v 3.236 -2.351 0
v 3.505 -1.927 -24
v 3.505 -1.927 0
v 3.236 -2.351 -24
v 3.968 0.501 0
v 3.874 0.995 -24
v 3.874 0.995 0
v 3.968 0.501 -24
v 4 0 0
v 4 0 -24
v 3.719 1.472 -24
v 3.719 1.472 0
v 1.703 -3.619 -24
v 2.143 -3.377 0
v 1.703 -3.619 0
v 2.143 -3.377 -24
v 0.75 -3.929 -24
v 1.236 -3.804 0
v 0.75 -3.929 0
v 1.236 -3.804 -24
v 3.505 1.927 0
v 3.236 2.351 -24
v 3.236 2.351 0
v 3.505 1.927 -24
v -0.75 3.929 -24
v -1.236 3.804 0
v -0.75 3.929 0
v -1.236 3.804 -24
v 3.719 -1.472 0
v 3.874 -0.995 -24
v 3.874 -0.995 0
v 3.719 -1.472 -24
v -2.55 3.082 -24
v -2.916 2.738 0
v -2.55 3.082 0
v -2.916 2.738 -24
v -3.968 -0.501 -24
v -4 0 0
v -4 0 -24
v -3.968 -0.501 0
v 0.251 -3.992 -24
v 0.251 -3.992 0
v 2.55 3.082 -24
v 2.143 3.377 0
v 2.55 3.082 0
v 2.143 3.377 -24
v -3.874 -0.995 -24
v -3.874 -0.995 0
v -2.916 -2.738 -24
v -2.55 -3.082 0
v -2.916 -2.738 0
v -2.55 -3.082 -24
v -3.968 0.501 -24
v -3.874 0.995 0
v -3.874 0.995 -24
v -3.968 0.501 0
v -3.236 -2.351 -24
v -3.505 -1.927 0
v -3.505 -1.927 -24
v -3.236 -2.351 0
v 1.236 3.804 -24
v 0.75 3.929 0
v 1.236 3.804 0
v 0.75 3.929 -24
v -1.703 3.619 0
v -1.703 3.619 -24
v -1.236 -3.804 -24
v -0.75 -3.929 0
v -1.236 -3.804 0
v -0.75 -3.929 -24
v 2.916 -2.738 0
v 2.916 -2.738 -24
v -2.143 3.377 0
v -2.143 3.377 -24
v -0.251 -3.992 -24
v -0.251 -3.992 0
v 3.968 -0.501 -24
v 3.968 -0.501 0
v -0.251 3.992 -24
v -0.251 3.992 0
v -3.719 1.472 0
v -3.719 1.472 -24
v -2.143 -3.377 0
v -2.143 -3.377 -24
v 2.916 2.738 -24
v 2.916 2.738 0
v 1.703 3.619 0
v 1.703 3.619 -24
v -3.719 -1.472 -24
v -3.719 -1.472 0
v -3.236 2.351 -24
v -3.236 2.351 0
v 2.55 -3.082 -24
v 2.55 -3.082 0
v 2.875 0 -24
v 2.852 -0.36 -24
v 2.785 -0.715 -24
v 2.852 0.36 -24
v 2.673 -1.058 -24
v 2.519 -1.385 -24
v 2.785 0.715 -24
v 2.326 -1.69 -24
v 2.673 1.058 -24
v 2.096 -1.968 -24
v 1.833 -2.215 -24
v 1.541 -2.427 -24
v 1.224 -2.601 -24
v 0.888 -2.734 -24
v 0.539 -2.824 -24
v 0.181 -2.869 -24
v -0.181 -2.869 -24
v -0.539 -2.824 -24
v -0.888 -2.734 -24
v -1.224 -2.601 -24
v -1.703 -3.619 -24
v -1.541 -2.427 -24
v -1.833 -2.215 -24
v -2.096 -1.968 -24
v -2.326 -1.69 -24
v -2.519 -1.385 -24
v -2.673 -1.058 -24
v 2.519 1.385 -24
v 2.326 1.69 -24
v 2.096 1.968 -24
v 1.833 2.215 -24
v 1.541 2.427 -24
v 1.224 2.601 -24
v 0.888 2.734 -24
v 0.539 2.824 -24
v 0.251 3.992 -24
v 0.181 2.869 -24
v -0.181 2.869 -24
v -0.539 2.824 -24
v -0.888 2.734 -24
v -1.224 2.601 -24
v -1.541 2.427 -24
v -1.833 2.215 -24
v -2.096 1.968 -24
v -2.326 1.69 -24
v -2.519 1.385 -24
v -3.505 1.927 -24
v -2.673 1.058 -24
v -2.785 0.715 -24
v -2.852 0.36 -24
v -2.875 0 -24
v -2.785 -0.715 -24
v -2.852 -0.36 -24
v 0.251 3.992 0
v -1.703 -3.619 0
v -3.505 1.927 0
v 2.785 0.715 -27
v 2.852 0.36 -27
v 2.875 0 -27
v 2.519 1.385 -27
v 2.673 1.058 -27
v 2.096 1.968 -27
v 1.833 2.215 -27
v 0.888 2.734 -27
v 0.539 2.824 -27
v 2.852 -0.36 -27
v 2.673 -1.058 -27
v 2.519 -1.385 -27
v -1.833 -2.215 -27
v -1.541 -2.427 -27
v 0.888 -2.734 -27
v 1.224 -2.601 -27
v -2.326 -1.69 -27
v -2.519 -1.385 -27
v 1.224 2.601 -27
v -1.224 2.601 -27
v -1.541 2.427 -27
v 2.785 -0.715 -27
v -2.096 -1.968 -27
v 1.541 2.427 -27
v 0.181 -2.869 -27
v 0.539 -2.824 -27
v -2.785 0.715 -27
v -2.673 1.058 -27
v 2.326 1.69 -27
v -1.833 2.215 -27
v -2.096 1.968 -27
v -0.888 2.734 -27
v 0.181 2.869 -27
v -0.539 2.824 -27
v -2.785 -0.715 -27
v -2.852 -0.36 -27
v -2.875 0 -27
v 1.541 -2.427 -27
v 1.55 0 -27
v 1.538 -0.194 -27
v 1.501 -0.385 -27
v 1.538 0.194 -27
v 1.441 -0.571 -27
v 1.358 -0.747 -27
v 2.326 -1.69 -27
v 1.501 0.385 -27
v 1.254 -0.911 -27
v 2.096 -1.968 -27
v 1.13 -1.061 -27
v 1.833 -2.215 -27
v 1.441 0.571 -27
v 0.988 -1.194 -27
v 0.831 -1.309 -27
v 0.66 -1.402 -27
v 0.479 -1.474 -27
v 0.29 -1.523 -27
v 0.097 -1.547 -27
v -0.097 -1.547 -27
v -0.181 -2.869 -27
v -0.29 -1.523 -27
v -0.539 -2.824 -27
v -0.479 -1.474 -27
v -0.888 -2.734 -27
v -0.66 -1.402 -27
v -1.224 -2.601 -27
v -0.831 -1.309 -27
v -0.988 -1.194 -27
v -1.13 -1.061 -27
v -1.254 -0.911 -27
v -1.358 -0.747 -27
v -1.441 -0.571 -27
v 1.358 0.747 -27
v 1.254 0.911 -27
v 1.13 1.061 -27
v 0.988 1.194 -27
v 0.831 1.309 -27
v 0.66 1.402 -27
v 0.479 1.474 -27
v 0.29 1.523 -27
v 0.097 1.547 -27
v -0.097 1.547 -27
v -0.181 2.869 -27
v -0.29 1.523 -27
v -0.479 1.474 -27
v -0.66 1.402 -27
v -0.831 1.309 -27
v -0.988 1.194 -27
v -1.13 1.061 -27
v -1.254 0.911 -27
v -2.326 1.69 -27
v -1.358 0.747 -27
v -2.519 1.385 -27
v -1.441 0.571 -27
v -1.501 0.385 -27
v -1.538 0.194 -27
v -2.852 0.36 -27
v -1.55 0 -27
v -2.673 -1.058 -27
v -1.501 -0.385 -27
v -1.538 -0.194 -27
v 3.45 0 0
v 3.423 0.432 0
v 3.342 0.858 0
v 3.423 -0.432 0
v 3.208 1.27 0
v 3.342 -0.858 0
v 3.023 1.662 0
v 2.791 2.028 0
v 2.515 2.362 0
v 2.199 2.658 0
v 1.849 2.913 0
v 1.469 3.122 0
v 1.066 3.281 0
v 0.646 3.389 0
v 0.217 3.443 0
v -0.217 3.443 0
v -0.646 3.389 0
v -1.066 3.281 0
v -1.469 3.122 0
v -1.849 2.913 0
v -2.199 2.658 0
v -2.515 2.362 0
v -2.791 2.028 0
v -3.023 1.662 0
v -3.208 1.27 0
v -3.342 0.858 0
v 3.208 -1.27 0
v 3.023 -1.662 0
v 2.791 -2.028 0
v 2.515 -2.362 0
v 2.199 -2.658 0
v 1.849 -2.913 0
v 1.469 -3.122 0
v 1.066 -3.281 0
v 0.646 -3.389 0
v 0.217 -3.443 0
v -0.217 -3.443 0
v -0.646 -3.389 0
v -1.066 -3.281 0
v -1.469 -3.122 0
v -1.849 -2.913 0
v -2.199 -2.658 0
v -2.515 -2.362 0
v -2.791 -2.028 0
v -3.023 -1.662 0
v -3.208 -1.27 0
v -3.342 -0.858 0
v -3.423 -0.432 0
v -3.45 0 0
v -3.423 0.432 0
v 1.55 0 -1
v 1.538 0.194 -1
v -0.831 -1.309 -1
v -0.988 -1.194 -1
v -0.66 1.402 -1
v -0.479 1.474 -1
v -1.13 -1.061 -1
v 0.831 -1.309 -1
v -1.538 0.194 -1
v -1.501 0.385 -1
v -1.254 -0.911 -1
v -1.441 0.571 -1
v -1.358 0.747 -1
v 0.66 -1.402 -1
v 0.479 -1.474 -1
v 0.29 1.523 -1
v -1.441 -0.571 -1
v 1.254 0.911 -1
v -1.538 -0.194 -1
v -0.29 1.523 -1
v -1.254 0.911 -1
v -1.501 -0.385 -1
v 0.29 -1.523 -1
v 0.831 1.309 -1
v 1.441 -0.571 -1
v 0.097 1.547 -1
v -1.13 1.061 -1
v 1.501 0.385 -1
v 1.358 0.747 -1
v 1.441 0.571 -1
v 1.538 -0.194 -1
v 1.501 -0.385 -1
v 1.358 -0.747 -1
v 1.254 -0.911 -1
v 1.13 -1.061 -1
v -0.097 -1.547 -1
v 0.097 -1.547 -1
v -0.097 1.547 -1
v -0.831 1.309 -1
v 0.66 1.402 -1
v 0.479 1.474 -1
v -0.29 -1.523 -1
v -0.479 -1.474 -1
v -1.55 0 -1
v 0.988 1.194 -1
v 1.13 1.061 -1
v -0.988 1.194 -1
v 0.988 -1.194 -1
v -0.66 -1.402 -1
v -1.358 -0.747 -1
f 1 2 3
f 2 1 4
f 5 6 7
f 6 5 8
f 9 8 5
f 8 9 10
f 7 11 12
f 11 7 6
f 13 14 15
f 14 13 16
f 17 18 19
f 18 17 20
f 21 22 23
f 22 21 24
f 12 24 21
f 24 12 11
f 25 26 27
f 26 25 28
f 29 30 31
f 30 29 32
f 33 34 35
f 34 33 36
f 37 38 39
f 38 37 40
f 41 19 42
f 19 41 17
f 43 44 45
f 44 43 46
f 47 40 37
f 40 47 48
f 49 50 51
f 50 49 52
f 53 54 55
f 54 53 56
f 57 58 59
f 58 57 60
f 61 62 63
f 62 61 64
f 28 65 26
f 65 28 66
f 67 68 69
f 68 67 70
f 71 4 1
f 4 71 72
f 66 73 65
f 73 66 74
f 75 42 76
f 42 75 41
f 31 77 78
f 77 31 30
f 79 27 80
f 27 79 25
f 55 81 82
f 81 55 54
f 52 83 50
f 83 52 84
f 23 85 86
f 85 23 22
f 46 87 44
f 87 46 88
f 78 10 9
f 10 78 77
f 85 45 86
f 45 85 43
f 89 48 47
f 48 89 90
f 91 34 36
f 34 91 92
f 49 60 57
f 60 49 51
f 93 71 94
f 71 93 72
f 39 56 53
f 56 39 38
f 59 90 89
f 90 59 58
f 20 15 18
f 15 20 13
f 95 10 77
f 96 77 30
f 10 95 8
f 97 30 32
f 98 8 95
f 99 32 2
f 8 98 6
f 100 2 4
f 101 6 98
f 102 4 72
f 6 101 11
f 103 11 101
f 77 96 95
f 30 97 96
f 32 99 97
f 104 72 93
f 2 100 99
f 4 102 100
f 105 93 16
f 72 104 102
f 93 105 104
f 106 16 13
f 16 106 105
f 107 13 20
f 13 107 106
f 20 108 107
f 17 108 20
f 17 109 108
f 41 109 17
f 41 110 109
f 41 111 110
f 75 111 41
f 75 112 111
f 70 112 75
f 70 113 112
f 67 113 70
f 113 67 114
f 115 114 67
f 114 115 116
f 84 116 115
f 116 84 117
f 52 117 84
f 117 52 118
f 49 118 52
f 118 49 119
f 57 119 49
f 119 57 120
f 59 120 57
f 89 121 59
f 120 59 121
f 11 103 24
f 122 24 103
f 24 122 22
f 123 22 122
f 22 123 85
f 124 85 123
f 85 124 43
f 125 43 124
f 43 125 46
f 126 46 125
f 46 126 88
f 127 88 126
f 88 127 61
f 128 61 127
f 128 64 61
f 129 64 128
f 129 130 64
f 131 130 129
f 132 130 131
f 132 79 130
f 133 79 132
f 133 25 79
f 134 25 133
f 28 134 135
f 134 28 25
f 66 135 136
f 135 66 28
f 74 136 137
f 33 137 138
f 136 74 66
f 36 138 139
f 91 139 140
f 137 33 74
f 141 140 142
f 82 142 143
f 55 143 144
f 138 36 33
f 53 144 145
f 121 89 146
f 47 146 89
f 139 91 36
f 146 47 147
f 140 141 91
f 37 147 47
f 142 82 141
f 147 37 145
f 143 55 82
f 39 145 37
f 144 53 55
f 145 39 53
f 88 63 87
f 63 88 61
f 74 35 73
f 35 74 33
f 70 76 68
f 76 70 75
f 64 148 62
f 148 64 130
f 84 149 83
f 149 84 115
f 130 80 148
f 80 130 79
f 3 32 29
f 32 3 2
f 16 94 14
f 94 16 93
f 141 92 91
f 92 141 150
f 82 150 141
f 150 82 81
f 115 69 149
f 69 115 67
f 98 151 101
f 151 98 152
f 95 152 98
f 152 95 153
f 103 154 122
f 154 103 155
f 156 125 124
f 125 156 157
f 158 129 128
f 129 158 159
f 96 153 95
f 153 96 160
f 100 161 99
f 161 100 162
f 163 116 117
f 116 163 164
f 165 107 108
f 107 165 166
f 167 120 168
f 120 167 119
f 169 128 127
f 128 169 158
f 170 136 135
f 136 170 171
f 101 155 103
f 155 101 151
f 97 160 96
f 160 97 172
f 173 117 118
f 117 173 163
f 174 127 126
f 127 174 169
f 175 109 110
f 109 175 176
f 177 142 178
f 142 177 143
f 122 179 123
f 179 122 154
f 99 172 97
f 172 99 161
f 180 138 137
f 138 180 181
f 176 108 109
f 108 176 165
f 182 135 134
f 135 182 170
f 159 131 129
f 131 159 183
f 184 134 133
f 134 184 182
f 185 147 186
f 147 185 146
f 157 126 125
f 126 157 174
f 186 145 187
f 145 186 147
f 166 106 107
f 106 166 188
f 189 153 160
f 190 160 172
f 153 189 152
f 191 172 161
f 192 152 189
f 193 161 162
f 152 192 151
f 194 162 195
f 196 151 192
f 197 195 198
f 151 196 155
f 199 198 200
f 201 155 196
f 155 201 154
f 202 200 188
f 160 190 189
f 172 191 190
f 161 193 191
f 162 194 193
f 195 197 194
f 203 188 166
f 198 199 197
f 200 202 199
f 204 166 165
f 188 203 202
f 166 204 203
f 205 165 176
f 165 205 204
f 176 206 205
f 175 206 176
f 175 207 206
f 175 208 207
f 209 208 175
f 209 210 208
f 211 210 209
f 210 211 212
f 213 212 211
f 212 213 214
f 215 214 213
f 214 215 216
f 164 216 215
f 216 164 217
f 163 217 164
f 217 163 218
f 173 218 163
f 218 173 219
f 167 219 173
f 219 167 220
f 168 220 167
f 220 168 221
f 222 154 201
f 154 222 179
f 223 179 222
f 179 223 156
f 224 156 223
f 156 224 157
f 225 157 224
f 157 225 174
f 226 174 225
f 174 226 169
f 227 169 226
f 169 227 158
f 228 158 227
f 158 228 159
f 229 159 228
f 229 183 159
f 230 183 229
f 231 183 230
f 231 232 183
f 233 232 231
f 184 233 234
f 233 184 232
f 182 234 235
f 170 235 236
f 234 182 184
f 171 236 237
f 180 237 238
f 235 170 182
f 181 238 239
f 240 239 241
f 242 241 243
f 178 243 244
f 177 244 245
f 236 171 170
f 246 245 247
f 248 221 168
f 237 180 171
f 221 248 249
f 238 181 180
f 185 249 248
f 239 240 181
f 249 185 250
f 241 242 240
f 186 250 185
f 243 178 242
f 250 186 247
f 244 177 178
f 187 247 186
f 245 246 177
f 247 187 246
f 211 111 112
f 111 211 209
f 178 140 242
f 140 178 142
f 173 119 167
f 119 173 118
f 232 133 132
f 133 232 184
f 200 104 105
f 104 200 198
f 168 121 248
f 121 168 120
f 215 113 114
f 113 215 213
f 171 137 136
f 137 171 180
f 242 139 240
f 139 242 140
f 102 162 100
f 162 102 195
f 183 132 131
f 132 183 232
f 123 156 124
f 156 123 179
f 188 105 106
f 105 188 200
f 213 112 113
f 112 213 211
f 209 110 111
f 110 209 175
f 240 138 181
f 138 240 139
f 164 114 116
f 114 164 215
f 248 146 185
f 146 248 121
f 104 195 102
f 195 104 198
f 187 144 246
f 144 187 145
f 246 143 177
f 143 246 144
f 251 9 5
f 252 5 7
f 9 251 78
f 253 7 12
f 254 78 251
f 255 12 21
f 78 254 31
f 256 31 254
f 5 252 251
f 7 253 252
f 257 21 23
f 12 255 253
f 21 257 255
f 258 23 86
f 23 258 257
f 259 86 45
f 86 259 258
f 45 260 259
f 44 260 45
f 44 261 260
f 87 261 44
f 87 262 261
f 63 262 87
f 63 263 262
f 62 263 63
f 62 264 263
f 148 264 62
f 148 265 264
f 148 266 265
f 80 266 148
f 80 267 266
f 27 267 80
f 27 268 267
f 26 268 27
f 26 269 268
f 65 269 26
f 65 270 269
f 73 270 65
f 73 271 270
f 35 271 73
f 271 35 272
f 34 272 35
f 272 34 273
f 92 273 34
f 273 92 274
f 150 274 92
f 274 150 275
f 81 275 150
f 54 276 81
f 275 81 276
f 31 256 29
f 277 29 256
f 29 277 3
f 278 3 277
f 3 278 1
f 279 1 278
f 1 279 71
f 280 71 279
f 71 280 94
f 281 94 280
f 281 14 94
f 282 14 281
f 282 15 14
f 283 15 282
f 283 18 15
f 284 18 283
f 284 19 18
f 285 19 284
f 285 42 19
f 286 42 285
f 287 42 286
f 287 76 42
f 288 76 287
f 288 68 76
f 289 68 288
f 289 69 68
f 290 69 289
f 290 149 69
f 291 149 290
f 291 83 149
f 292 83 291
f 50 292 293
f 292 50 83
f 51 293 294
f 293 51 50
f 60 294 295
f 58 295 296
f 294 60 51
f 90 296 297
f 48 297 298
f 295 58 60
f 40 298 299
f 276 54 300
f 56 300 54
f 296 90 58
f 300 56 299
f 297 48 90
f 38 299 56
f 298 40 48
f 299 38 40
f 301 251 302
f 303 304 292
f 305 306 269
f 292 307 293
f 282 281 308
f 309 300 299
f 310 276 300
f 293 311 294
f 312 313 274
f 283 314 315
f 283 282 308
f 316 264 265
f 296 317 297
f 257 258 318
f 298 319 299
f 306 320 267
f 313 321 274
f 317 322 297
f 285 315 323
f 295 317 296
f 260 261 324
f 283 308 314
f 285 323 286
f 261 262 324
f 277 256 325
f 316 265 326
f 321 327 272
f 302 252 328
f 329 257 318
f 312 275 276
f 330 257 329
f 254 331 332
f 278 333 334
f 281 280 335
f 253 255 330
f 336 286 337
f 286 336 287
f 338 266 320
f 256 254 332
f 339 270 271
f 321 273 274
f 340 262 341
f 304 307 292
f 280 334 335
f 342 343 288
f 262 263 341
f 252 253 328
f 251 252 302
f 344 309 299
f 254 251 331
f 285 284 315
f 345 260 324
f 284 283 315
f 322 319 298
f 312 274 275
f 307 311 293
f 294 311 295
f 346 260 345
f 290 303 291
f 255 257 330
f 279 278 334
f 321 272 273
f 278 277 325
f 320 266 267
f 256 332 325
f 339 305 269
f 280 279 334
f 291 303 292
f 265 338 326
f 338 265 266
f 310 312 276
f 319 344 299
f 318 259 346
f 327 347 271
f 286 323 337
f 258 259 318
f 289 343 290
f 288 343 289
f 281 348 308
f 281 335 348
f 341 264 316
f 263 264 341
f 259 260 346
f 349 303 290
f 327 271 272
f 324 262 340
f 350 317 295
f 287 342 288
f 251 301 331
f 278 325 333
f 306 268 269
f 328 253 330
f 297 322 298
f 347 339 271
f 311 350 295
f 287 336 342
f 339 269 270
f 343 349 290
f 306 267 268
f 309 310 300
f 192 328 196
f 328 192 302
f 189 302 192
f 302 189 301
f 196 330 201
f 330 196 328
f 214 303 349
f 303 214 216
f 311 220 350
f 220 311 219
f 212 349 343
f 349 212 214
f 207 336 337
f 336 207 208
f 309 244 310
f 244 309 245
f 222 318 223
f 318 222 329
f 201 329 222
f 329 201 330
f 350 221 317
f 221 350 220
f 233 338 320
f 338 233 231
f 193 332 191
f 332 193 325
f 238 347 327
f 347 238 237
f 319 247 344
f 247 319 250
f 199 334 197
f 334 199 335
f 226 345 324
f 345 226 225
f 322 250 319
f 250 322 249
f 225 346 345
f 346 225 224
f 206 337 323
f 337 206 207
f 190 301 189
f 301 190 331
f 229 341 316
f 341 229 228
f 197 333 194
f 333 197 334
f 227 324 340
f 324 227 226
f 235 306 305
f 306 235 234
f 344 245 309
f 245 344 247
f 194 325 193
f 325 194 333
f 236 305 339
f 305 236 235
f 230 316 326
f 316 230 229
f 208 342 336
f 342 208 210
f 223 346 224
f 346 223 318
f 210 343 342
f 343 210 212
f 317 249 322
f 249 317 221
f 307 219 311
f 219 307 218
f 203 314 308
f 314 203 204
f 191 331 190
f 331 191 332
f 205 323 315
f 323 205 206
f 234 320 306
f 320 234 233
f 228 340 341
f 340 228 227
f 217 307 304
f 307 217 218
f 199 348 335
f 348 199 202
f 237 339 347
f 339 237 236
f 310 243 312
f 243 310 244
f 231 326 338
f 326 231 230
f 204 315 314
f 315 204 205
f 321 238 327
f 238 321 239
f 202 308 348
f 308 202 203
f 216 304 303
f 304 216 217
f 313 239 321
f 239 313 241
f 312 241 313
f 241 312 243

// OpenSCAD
$fn = 50;

difference() {
	union() {
		translate(v = [0, 0, -24.0]) {
			cylinder(h = 27, r = 4.0);
		}
		#translate(v = [0, 0, -27.0]) {
			cylinder(h = 27, r = 2.875);
		}
	}
	union() {
		translate(v = [0, 0, 0]) {
			rotate(a = [0, 0, 0]) {
				difference() {
					union() {
						translate(v = [0, 0, -27.0]) {
							cylinder(h = 27, r = 1.25);
						}
						translate(v = [0, 0, -1.0]) {
							cylinder(h = 1.0, r1 = 1.55, r2 = 3.45);
						}
						translate(v = [0, 0, -27.0]) {
							cylinder(h = 27, r = 1.55);
						}
						translate(v = [0, 0, -27.0]) {
							cylinder(h = 27, r = 1.25);
						}
					}
					union();
				}
			}
		}
		#cylinder(h = 3, r = 5.0);
	}
}
